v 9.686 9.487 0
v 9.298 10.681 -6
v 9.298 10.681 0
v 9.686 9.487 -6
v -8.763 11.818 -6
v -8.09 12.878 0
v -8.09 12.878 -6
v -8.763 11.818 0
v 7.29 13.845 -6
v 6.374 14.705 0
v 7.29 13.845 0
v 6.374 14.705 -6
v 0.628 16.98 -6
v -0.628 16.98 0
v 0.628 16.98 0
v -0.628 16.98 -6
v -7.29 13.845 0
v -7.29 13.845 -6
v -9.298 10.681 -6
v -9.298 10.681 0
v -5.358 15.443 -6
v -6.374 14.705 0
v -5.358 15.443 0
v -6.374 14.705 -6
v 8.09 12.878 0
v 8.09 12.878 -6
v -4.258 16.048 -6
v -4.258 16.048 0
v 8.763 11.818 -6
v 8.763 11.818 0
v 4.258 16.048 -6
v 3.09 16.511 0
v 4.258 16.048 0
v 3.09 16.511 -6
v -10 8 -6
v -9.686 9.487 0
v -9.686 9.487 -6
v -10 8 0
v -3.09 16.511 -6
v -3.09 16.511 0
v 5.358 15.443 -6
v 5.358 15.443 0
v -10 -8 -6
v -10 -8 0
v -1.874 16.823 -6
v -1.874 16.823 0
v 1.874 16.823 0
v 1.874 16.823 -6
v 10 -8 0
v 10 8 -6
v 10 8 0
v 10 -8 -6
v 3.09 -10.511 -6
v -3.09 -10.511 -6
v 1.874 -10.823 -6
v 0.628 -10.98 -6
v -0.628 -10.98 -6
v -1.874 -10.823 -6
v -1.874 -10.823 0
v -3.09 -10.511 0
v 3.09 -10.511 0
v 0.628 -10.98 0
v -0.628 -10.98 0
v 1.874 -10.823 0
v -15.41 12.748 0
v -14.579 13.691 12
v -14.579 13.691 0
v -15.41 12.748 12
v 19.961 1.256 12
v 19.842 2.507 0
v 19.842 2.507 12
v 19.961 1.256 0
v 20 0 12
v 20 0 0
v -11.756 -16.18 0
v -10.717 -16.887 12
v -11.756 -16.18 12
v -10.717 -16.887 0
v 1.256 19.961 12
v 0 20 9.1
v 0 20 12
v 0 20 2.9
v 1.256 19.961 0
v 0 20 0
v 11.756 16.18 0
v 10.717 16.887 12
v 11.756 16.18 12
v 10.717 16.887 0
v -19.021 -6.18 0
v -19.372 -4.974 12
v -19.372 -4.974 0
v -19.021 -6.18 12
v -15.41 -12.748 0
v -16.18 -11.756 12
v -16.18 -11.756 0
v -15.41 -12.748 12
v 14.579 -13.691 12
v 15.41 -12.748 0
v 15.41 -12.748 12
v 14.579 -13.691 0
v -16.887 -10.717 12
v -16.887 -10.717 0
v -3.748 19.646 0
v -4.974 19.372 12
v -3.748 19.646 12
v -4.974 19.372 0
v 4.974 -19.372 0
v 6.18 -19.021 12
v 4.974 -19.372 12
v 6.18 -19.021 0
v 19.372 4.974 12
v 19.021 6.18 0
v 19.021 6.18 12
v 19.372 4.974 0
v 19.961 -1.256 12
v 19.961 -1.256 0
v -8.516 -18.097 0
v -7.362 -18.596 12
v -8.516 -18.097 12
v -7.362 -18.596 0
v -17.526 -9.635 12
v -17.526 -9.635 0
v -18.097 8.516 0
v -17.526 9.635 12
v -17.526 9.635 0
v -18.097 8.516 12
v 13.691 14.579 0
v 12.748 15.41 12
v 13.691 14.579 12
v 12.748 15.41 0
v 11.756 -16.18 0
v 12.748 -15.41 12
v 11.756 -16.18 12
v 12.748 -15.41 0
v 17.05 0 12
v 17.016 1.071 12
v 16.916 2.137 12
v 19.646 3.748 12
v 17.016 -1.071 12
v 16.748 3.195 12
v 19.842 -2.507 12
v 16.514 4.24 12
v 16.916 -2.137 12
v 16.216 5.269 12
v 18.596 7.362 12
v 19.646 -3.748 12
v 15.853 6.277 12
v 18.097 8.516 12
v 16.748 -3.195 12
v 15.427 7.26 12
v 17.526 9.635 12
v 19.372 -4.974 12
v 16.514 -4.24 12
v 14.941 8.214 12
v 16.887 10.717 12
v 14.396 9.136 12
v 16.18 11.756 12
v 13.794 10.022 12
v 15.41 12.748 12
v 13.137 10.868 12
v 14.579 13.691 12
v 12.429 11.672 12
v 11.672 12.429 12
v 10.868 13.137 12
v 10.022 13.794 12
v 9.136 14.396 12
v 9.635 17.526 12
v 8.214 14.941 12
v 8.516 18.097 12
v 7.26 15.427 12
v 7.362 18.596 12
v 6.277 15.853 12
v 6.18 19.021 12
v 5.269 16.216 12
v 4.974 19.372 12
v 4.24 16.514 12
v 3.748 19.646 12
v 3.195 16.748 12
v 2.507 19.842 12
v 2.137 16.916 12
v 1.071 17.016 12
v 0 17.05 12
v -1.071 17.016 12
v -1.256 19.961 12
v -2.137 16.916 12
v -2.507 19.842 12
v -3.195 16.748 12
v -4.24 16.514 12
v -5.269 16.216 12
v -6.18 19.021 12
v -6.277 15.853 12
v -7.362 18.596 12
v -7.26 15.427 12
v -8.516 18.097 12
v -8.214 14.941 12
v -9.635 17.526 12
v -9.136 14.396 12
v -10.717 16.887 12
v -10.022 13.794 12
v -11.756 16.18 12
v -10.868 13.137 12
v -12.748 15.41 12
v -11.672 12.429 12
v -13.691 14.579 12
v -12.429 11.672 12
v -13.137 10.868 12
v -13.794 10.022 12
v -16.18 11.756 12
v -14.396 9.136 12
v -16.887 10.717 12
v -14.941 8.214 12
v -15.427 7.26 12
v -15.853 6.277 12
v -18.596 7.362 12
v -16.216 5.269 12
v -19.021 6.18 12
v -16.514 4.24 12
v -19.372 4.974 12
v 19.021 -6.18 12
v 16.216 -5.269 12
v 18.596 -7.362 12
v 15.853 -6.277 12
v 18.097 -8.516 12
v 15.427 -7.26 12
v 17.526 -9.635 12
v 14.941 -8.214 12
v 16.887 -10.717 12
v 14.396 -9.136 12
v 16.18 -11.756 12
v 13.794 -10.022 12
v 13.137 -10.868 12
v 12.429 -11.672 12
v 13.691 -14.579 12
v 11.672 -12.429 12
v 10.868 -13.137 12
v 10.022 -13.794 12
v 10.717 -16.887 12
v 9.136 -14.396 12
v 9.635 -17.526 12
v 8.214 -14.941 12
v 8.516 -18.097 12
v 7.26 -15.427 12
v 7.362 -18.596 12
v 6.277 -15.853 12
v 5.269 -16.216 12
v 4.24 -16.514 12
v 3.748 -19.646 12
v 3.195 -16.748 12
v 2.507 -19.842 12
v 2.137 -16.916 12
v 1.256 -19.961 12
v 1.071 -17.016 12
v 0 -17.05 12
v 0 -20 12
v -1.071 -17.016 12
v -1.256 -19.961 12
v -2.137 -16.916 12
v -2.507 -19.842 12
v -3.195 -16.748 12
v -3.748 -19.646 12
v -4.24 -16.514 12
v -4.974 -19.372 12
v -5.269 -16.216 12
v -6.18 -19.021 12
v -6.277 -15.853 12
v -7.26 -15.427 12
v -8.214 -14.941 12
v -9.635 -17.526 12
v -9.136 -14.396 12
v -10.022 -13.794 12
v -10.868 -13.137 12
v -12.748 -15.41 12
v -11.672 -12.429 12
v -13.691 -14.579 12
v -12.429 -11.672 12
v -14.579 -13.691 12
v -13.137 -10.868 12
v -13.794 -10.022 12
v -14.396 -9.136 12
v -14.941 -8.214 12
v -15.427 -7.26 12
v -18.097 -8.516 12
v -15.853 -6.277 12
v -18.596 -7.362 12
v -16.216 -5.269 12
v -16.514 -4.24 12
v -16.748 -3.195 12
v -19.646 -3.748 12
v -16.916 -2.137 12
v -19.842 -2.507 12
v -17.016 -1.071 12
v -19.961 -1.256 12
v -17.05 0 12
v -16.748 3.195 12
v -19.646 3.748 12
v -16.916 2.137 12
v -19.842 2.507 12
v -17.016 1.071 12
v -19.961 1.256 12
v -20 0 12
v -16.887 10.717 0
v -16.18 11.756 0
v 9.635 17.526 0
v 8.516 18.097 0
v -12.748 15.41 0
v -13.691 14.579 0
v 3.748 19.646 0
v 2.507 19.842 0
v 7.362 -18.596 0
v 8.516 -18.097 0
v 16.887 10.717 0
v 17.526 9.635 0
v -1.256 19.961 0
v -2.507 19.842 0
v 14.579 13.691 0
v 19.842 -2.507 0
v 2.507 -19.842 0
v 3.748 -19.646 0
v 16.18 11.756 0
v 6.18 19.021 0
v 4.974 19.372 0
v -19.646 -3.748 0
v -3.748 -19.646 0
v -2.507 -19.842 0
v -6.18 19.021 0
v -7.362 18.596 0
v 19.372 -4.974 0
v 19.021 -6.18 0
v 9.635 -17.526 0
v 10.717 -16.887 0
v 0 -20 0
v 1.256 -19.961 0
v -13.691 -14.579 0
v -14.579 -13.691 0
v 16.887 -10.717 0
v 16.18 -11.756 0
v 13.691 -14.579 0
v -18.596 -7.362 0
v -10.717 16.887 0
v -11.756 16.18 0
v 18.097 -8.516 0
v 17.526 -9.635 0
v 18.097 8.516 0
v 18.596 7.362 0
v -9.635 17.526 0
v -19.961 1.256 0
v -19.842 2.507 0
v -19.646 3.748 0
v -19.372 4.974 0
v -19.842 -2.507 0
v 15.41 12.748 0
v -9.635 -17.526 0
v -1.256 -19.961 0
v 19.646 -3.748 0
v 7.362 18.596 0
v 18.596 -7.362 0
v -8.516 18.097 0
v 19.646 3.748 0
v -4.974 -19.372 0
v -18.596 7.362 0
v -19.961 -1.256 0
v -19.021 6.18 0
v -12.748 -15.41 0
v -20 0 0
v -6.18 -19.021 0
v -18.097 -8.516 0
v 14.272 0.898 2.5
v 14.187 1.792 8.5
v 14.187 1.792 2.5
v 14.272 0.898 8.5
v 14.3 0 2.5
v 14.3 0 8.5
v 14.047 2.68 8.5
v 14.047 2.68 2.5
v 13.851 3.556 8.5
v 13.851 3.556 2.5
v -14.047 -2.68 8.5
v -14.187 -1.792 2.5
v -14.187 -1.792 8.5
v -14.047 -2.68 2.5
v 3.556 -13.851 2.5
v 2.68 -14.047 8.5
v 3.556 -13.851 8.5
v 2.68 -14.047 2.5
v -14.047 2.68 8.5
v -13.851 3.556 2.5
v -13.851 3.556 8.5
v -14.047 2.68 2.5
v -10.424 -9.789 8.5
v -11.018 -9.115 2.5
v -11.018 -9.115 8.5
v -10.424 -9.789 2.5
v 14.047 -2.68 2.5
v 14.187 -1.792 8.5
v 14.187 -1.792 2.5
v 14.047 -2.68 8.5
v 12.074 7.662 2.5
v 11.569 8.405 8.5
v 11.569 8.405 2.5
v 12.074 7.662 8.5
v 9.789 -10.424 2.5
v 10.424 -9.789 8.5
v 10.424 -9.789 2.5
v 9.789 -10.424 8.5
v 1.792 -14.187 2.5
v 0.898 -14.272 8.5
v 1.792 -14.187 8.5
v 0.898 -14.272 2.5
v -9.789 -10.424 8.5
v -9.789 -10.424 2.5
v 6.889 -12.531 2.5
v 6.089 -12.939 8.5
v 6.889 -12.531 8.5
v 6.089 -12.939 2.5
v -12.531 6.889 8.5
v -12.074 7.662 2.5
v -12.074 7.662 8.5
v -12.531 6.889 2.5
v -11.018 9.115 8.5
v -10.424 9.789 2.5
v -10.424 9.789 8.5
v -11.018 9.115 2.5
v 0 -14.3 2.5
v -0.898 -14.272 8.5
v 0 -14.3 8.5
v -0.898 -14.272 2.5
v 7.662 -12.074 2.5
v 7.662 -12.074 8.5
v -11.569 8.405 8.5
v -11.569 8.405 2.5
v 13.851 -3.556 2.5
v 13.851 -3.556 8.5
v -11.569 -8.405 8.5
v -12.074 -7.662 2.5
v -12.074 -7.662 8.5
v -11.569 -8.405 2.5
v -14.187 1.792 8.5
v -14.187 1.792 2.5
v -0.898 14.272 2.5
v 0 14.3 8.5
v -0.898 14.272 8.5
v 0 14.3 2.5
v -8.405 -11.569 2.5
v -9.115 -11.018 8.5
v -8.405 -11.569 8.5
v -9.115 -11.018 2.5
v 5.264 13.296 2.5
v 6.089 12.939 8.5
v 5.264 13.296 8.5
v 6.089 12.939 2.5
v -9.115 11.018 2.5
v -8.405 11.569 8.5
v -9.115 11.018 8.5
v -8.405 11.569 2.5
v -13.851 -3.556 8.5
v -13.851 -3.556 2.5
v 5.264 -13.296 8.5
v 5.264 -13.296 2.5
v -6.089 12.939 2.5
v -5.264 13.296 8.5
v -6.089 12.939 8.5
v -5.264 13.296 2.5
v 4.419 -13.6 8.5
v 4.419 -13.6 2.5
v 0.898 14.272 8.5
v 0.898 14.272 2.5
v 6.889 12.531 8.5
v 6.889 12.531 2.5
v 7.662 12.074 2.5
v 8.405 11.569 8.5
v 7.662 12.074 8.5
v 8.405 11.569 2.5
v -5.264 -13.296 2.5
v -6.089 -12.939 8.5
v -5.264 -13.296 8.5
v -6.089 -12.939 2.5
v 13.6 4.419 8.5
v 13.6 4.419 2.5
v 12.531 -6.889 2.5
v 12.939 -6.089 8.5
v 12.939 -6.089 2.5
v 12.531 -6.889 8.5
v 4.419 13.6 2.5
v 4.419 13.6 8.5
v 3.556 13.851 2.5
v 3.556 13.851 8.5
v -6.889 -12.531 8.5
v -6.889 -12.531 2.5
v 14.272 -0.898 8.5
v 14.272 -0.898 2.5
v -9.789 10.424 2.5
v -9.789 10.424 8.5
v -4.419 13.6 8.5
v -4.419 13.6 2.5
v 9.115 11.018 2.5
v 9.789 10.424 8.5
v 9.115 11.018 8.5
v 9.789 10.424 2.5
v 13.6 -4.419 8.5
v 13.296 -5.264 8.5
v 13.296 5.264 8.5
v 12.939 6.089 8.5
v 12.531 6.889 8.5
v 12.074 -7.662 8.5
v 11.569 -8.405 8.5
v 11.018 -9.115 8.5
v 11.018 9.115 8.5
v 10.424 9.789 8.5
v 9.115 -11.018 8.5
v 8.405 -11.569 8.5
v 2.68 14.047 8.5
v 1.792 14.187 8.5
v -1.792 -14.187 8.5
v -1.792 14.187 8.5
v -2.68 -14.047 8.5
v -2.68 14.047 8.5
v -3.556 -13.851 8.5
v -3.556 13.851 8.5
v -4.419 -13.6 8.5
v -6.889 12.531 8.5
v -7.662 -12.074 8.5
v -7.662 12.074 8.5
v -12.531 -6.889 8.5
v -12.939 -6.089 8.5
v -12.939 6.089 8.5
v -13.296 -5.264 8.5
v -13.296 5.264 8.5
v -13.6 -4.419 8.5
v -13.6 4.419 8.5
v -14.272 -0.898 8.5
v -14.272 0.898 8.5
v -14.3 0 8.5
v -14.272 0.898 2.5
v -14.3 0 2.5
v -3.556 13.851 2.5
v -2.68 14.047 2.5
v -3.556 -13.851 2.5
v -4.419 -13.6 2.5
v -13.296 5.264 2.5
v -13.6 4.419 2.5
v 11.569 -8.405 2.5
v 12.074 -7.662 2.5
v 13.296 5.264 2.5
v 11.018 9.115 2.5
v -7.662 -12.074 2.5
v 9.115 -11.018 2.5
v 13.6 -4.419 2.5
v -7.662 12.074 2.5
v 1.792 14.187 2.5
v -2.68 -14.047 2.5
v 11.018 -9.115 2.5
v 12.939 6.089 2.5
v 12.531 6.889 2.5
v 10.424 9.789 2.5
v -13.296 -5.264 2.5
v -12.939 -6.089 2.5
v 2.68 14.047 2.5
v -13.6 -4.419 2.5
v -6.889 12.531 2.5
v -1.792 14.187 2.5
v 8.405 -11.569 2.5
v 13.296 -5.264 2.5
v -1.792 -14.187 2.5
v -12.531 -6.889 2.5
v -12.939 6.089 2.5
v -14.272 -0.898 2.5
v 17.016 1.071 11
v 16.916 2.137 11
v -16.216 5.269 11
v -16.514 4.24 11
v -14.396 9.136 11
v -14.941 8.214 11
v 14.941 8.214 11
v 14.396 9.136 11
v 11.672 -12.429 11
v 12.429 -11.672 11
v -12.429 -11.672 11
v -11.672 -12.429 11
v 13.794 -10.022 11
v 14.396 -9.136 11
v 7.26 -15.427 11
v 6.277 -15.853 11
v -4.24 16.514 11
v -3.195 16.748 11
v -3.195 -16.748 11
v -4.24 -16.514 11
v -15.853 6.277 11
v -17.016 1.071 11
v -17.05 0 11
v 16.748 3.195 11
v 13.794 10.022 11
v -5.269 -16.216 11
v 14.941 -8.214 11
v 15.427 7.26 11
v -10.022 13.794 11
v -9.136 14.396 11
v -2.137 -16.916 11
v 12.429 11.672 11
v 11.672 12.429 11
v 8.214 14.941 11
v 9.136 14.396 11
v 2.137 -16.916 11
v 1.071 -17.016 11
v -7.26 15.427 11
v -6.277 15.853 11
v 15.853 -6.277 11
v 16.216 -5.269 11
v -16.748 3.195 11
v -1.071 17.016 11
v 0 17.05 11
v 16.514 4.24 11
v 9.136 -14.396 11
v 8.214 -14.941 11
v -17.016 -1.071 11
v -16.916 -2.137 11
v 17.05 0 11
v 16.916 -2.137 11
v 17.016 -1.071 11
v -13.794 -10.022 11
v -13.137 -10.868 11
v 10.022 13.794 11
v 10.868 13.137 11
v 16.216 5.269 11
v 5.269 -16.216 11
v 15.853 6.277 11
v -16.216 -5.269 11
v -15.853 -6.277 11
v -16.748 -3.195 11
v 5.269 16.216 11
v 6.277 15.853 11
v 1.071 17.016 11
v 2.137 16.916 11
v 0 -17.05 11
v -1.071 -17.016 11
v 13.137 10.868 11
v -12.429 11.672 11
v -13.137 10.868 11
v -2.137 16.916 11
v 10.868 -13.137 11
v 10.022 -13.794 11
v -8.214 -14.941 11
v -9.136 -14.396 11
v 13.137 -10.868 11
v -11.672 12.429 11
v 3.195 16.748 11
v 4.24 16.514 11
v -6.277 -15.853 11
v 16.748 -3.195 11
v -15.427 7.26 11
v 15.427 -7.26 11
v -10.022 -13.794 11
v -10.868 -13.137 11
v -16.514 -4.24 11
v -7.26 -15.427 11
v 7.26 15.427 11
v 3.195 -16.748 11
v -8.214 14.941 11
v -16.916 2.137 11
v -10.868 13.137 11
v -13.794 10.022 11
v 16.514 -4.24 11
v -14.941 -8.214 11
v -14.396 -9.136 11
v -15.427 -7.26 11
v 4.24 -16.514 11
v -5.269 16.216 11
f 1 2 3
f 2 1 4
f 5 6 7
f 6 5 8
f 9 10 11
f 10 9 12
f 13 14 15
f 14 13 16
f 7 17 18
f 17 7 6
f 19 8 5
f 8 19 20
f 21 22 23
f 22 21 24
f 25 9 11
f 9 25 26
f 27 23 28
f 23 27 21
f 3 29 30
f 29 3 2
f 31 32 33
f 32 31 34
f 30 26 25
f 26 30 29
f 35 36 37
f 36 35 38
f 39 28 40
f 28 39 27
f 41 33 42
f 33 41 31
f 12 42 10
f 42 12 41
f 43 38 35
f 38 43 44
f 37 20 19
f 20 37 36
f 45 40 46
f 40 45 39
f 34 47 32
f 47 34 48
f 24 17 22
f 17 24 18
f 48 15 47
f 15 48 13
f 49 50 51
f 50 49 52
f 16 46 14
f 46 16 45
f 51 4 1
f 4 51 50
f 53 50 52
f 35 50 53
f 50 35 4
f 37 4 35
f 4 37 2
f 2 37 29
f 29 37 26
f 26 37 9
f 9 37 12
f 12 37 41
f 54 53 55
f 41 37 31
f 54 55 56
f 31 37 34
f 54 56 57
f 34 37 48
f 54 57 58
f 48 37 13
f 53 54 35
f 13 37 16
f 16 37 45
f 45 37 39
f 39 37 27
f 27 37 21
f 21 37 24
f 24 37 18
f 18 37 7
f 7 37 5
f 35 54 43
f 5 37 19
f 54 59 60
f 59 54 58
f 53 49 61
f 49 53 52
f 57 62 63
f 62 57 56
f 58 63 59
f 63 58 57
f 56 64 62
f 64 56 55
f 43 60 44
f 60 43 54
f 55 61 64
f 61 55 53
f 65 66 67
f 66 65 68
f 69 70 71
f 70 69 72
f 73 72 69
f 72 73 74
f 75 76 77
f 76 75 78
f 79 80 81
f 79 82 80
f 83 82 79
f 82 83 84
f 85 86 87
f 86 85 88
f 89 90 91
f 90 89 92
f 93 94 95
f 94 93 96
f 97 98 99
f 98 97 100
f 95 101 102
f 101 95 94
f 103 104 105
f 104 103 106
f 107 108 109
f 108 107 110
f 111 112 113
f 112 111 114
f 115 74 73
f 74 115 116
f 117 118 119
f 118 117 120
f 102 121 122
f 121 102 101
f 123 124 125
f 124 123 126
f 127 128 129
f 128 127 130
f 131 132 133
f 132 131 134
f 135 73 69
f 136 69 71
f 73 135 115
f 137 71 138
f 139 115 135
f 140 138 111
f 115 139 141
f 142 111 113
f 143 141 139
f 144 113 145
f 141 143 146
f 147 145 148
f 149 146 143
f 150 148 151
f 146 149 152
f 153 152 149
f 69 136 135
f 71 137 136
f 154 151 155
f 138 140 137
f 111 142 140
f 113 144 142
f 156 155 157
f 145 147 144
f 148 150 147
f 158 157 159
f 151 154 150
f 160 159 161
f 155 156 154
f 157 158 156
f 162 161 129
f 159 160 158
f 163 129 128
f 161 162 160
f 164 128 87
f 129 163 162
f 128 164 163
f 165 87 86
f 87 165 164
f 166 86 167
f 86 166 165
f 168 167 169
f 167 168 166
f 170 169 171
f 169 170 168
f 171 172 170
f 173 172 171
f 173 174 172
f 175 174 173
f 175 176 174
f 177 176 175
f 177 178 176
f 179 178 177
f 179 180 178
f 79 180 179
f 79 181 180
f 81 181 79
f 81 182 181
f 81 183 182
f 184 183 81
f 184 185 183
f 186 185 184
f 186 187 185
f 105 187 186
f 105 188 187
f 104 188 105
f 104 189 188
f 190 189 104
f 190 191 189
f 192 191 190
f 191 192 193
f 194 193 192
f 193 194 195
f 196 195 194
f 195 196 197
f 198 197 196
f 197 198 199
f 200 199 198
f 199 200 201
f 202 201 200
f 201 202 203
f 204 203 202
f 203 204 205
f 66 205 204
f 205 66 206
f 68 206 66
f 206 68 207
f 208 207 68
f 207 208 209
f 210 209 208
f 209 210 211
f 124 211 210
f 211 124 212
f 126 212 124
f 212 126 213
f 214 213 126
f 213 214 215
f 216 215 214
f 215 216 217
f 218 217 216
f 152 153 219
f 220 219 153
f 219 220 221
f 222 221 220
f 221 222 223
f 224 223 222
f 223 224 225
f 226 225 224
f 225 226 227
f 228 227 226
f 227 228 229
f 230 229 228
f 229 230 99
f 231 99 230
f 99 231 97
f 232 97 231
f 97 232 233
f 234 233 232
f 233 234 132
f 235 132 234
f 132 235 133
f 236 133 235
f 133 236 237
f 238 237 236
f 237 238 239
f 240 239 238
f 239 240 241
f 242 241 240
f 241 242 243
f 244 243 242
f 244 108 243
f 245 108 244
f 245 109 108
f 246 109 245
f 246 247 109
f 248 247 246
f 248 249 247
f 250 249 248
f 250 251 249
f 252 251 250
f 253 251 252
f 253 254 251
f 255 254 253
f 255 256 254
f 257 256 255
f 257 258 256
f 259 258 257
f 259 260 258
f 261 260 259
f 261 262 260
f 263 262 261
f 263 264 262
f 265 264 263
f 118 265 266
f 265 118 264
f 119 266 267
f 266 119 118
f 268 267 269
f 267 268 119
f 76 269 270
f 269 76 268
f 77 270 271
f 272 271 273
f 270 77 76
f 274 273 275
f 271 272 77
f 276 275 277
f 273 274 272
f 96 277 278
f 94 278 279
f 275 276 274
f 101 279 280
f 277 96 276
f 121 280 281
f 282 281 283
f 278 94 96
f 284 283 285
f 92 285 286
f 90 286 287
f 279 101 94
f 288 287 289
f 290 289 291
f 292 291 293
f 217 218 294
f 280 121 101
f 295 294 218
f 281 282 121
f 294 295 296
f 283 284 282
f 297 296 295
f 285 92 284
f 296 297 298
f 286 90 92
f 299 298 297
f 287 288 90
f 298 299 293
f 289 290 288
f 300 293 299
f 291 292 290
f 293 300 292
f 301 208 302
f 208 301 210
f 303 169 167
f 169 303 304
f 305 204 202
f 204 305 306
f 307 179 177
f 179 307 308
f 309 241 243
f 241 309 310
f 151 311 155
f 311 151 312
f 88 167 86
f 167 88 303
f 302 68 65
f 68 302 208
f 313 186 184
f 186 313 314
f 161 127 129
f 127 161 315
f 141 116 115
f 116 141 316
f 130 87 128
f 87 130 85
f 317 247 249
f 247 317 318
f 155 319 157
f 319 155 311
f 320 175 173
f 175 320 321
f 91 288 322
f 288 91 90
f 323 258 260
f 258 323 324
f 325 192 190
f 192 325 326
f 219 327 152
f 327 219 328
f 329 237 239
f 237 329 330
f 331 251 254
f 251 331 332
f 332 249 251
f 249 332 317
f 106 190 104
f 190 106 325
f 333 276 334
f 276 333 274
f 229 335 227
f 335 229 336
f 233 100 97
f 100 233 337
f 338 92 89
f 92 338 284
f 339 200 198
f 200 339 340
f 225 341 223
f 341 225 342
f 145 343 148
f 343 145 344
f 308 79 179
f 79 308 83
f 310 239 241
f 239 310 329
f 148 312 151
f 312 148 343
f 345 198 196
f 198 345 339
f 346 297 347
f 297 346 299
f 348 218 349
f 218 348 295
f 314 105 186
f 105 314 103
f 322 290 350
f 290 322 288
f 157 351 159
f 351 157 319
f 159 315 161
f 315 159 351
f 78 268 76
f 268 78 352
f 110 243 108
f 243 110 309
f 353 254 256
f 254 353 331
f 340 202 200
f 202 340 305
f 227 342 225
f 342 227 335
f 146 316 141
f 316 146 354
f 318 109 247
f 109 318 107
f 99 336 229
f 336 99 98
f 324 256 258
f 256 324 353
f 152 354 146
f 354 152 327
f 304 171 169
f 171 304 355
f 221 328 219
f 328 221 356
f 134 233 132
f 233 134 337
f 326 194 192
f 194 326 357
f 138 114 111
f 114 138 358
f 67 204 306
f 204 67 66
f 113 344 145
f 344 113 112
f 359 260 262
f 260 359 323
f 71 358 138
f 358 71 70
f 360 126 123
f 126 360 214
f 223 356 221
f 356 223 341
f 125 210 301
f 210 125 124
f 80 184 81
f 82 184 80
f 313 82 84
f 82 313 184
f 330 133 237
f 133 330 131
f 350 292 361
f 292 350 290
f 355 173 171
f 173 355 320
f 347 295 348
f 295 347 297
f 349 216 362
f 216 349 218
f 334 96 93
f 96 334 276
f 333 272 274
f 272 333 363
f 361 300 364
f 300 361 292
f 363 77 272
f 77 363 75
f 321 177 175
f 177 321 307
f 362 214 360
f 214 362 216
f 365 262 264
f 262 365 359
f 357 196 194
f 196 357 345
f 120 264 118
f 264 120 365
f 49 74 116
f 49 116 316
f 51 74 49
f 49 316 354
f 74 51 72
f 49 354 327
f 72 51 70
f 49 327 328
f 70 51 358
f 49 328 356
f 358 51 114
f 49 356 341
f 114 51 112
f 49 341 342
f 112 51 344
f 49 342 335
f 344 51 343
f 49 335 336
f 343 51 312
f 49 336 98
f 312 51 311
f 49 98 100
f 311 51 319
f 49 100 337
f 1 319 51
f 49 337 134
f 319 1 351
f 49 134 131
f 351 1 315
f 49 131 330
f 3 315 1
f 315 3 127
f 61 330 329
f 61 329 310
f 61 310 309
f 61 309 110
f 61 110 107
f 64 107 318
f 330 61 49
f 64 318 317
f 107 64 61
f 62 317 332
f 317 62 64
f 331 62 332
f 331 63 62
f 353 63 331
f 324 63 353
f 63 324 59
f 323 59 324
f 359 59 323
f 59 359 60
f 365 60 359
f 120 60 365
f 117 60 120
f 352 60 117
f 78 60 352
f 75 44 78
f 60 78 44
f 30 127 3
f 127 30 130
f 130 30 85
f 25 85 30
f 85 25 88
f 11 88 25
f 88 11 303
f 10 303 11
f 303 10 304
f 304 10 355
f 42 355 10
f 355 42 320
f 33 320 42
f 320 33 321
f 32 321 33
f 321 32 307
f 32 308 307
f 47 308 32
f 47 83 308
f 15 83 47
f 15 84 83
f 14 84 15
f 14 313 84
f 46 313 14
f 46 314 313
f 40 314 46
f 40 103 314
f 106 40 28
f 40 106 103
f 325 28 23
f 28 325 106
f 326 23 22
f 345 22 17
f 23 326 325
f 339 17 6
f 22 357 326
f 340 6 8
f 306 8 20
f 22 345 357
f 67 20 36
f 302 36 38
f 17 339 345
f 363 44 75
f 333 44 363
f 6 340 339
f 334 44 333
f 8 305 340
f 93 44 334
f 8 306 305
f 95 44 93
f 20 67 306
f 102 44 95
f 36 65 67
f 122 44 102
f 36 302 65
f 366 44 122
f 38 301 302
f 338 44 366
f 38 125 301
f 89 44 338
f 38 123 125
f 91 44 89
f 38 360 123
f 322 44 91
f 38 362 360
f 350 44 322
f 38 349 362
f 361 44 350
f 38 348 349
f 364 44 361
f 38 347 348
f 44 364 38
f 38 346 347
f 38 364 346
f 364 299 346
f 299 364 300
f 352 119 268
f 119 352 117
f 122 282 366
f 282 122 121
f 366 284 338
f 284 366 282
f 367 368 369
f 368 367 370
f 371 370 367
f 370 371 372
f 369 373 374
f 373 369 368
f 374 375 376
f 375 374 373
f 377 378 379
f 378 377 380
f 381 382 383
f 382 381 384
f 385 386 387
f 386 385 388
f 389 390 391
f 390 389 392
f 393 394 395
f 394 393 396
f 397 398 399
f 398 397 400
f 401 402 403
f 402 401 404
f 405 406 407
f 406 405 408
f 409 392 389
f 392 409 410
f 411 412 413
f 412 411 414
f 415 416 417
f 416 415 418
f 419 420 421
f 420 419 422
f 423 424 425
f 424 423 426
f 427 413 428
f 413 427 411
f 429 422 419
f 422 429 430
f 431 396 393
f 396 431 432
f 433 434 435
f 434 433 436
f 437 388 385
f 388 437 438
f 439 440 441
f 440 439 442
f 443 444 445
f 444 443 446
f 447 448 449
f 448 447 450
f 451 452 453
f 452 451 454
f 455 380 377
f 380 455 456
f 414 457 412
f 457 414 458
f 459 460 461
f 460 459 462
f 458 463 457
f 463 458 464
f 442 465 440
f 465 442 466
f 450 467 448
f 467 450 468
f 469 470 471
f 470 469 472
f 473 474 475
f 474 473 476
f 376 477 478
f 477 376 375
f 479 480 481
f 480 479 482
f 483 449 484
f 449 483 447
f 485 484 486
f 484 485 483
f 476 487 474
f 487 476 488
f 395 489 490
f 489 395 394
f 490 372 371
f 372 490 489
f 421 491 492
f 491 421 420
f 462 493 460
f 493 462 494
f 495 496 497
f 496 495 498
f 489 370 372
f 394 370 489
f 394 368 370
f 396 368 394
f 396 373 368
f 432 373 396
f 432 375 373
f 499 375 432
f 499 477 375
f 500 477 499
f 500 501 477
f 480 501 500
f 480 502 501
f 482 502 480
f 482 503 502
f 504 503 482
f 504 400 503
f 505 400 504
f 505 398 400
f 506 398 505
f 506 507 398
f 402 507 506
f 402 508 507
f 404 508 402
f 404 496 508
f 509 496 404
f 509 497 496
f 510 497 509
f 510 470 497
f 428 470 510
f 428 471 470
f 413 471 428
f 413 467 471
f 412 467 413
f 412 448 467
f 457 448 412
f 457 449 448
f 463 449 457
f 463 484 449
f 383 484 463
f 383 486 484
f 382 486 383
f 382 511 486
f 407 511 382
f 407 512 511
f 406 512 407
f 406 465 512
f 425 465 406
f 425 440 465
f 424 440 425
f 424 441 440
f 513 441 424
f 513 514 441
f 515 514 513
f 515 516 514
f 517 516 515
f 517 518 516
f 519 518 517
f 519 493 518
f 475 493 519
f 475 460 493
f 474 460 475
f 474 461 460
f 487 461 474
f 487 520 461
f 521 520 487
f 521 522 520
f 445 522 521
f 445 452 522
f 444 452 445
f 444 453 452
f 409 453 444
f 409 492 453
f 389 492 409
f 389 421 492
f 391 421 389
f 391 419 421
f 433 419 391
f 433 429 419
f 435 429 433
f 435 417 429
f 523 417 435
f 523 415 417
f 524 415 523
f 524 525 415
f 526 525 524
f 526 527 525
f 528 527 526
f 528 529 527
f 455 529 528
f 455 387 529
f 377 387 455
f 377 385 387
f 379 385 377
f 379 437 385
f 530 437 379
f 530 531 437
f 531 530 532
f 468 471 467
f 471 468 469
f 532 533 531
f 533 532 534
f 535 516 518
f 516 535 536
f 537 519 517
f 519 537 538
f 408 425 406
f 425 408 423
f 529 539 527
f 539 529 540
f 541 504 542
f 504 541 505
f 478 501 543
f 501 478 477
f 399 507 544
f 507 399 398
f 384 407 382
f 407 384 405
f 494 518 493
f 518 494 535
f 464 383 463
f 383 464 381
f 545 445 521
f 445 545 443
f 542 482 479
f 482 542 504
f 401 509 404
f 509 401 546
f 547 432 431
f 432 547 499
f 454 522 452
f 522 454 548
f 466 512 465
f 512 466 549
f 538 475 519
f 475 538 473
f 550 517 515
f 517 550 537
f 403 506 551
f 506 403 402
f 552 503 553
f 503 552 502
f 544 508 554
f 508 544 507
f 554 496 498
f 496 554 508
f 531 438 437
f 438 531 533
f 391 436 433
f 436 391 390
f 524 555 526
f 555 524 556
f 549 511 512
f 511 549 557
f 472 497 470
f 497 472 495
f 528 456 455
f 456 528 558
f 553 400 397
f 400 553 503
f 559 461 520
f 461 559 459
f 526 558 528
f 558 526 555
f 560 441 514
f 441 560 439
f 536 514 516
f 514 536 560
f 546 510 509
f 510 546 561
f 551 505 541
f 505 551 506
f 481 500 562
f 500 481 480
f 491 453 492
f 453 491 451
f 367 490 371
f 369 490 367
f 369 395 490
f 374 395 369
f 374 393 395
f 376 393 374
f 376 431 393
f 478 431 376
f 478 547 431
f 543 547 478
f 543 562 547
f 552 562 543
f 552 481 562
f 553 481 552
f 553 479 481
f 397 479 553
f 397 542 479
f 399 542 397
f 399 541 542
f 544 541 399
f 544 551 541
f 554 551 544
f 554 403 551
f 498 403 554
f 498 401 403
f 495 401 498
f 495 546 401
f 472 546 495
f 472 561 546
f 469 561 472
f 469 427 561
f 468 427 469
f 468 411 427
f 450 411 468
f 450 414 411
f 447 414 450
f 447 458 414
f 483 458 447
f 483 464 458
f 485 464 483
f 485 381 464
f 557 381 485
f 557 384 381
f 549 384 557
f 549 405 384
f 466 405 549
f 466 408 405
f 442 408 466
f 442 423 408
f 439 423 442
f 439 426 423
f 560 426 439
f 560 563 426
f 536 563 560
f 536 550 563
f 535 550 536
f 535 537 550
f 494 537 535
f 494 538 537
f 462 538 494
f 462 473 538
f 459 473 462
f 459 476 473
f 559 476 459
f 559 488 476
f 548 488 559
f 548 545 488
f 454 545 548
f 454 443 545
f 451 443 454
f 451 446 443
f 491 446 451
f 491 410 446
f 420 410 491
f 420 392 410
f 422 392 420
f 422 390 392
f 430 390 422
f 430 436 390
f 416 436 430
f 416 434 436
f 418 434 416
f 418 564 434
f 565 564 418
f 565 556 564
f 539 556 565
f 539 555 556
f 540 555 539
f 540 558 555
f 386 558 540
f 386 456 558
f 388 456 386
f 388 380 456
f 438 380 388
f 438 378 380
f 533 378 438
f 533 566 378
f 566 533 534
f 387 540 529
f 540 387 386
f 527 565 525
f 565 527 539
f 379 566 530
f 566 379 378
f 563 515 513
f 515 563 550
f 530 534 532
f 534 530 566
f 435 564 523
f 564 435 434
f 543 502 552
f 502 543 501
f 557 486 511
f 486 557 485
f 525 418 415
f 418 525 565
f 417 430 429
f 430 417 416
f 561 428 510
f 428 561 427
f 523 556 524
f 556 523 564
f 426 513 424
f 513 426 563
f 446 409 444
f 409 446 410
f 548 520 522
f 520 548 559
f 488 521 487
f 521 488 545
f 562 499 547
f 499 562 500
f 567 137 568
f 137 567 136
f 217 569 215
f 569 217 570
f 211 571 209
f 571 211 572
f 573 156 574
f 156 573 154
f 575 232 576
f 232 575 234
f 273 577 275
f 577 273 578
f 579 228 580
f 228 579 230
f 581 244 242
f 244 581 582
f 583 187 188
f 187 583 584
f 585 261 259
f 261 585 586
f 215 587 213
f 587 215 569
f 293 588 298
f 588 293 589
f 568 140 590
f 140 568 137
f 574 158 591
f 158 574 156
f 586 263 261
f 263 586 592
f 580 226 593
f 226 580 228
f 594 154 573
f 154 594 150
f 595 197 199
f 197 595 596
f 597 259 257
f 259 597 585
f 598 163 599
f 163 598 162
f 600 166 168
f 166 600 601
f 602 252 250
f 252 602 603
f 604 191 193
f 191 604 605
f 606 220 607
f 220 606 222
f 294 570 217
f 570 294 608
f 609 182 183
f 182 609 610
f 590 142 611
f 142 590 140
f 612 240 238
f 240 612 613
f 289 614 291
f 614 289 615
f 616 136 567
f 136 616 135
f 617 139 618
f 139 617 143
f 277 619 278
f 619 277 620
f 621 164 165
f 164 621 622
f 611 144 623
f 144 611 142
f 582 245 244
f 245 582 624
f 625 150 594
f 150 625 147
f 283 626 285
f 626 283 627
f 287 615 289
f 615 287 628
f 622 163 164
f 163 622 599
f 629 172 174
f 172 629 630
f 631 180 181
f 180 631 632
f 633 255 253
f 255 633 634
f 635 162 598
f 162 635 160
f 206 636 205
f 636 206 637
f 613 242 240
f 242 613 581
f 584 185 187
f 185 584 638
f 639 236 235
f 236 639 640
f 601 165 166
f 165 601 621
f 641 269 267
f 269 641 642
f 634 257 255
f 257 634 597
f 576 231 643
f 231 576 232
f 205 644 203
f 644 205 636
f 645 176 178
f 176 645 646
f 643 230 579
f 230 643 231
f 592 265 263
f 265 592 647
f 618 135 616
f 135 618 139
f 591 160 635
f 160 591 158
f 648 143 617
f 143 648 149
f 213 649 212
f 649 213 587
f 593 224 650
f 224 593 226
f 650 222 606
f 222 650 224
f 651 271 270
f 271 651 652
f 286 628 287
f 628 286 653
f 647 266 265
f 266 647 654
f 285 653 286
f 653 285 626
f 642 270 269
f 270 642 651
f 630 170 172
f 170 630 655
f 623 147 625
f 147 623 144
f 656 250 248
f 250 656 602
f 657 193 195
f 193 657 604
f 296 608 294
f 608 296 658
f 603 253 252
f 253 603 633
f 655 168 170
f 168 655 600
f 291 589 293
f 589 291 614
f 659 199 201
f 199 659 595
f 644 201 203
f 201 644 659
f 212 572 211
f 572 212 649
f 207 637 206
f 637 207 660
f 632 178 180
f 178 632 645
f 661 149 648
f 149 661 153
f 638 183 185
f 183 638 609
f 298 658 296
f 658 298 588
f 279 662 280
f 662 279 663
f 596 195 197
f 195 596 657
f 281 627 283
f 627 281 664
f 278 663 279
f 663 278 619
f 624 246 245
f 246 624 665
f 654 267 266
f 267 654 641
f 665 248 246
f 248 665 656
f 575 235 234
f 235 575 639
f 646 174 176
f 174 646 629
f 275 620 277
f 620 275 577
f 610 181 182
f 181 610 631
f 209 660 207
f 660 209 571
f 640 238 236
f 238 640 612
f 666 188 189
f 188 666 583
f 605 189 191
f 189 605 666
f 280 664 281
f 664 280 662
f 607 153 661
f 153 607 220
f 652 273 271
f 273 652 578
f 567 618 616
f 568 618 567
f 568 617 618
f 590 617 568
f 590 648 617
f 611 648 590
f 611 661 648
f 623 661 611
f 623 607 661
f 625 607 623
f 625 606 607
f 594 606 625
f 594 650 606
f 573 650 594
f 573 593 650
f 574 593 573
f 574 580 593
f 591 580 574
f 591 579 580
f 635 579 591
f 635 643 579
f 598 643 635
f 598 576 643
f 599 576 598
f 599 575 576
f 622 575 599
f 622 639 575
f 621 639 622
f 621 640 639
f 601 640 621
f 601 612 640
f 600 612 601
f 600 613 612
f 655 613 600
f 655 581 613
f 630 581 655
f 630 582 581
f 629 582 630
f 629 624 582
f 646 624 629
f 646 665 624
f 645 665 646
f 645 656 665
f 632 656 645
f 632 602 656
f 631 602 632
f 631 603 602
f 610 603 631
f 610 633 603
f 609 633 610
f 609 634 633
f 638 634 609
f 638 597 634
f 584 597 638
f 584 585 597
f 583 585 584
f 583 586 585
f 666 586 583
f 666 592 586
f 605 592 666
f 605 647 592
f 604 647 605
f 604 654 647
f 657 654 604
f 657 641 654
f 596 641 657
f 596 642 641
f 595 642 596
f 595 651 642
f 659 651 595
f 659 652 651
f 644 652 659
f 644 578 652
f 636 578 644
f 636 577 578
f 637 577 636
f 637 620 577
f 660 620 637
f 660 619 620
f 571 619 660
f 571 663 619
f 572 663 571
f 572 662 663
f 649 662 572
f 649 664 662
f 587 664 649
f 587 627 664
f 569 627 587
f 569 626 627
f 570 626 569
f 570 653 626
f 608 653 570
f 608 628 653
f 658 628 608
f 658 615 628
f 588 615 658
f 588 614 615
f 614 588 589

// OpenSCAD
// Open Source Watch Case Template
// Generated from YAML configuration

// Configuration variables
case_diameter = 40.0;
case_thickness = 12.0;
lug_width = 20.0;
lug_to_lug = 48.0;
movement_diameter = 28.5;
movement_thickness = 5.5;
crown_position = 3;
crown_diameter = 6.0;
tolerance = 0.1;

// Calculated values
movement_cavity_diameter = movement_diameter + tolerance;
crown_angle = crown_position * 30; // Convert to degrees

module watch_case() {
    difference() {
        union() {
            // Main case body
            cylinder(h=case_thickness, d=case_diameter, center=false, $fn=100);
            
            // Lugs
            lug_offset = lug_to_lug/2 - case_diameter/2;
            translate([0, lug_offset, 0])
                lug(lug_width);
            translate([0, -lug_offset, 0])
                lug(lug_width);
        }
        
        // Movement cavity
        translate([0, 0, 2.5])
            cylinder(h=movement_thickness + 0.5, 
                    d=movement_cavity_diameter, $fn=100);
        
        // Crown hole
        rotate([0, 0, crown_angle])
            translate([case_diameter/2, 0, case_thickness/2])
                rotate([0, 90, 0])
                    cylinder(h=8, d=crown_diameter + 0.2, $fn=50);
        
        // Crystal seat
        translate([0, 0, case_thickness - 1])
            cylinder(h=2, d=34.0 + 0.1, $fn=100);
    }
}

module lug(width) {
    lug_length = 8;
    lug_height = case_thickness;
    
    hull() {
        translate([0, 0, 0])
            cube([width, lug_length, lug_height], center=true);
        translate([0, lug_length/2 - 1, 0])
            cylinder(h=lug_height, d=width, center=true, $fn=50);
    }
    
    // Spring bar holes
    translate([width/2 - 1, 0, 0])
        rotate([0, 90, 0])
            cylinder(h=2, d=1.6, center=true, $fn=20);
    translate([-width/2 + 1, 0, 0])
        rotate([0, 90, 0])
            cylinder(h=2, d=1.6, center=true, $fn=20);
}

// Generate the case
watch_case();
